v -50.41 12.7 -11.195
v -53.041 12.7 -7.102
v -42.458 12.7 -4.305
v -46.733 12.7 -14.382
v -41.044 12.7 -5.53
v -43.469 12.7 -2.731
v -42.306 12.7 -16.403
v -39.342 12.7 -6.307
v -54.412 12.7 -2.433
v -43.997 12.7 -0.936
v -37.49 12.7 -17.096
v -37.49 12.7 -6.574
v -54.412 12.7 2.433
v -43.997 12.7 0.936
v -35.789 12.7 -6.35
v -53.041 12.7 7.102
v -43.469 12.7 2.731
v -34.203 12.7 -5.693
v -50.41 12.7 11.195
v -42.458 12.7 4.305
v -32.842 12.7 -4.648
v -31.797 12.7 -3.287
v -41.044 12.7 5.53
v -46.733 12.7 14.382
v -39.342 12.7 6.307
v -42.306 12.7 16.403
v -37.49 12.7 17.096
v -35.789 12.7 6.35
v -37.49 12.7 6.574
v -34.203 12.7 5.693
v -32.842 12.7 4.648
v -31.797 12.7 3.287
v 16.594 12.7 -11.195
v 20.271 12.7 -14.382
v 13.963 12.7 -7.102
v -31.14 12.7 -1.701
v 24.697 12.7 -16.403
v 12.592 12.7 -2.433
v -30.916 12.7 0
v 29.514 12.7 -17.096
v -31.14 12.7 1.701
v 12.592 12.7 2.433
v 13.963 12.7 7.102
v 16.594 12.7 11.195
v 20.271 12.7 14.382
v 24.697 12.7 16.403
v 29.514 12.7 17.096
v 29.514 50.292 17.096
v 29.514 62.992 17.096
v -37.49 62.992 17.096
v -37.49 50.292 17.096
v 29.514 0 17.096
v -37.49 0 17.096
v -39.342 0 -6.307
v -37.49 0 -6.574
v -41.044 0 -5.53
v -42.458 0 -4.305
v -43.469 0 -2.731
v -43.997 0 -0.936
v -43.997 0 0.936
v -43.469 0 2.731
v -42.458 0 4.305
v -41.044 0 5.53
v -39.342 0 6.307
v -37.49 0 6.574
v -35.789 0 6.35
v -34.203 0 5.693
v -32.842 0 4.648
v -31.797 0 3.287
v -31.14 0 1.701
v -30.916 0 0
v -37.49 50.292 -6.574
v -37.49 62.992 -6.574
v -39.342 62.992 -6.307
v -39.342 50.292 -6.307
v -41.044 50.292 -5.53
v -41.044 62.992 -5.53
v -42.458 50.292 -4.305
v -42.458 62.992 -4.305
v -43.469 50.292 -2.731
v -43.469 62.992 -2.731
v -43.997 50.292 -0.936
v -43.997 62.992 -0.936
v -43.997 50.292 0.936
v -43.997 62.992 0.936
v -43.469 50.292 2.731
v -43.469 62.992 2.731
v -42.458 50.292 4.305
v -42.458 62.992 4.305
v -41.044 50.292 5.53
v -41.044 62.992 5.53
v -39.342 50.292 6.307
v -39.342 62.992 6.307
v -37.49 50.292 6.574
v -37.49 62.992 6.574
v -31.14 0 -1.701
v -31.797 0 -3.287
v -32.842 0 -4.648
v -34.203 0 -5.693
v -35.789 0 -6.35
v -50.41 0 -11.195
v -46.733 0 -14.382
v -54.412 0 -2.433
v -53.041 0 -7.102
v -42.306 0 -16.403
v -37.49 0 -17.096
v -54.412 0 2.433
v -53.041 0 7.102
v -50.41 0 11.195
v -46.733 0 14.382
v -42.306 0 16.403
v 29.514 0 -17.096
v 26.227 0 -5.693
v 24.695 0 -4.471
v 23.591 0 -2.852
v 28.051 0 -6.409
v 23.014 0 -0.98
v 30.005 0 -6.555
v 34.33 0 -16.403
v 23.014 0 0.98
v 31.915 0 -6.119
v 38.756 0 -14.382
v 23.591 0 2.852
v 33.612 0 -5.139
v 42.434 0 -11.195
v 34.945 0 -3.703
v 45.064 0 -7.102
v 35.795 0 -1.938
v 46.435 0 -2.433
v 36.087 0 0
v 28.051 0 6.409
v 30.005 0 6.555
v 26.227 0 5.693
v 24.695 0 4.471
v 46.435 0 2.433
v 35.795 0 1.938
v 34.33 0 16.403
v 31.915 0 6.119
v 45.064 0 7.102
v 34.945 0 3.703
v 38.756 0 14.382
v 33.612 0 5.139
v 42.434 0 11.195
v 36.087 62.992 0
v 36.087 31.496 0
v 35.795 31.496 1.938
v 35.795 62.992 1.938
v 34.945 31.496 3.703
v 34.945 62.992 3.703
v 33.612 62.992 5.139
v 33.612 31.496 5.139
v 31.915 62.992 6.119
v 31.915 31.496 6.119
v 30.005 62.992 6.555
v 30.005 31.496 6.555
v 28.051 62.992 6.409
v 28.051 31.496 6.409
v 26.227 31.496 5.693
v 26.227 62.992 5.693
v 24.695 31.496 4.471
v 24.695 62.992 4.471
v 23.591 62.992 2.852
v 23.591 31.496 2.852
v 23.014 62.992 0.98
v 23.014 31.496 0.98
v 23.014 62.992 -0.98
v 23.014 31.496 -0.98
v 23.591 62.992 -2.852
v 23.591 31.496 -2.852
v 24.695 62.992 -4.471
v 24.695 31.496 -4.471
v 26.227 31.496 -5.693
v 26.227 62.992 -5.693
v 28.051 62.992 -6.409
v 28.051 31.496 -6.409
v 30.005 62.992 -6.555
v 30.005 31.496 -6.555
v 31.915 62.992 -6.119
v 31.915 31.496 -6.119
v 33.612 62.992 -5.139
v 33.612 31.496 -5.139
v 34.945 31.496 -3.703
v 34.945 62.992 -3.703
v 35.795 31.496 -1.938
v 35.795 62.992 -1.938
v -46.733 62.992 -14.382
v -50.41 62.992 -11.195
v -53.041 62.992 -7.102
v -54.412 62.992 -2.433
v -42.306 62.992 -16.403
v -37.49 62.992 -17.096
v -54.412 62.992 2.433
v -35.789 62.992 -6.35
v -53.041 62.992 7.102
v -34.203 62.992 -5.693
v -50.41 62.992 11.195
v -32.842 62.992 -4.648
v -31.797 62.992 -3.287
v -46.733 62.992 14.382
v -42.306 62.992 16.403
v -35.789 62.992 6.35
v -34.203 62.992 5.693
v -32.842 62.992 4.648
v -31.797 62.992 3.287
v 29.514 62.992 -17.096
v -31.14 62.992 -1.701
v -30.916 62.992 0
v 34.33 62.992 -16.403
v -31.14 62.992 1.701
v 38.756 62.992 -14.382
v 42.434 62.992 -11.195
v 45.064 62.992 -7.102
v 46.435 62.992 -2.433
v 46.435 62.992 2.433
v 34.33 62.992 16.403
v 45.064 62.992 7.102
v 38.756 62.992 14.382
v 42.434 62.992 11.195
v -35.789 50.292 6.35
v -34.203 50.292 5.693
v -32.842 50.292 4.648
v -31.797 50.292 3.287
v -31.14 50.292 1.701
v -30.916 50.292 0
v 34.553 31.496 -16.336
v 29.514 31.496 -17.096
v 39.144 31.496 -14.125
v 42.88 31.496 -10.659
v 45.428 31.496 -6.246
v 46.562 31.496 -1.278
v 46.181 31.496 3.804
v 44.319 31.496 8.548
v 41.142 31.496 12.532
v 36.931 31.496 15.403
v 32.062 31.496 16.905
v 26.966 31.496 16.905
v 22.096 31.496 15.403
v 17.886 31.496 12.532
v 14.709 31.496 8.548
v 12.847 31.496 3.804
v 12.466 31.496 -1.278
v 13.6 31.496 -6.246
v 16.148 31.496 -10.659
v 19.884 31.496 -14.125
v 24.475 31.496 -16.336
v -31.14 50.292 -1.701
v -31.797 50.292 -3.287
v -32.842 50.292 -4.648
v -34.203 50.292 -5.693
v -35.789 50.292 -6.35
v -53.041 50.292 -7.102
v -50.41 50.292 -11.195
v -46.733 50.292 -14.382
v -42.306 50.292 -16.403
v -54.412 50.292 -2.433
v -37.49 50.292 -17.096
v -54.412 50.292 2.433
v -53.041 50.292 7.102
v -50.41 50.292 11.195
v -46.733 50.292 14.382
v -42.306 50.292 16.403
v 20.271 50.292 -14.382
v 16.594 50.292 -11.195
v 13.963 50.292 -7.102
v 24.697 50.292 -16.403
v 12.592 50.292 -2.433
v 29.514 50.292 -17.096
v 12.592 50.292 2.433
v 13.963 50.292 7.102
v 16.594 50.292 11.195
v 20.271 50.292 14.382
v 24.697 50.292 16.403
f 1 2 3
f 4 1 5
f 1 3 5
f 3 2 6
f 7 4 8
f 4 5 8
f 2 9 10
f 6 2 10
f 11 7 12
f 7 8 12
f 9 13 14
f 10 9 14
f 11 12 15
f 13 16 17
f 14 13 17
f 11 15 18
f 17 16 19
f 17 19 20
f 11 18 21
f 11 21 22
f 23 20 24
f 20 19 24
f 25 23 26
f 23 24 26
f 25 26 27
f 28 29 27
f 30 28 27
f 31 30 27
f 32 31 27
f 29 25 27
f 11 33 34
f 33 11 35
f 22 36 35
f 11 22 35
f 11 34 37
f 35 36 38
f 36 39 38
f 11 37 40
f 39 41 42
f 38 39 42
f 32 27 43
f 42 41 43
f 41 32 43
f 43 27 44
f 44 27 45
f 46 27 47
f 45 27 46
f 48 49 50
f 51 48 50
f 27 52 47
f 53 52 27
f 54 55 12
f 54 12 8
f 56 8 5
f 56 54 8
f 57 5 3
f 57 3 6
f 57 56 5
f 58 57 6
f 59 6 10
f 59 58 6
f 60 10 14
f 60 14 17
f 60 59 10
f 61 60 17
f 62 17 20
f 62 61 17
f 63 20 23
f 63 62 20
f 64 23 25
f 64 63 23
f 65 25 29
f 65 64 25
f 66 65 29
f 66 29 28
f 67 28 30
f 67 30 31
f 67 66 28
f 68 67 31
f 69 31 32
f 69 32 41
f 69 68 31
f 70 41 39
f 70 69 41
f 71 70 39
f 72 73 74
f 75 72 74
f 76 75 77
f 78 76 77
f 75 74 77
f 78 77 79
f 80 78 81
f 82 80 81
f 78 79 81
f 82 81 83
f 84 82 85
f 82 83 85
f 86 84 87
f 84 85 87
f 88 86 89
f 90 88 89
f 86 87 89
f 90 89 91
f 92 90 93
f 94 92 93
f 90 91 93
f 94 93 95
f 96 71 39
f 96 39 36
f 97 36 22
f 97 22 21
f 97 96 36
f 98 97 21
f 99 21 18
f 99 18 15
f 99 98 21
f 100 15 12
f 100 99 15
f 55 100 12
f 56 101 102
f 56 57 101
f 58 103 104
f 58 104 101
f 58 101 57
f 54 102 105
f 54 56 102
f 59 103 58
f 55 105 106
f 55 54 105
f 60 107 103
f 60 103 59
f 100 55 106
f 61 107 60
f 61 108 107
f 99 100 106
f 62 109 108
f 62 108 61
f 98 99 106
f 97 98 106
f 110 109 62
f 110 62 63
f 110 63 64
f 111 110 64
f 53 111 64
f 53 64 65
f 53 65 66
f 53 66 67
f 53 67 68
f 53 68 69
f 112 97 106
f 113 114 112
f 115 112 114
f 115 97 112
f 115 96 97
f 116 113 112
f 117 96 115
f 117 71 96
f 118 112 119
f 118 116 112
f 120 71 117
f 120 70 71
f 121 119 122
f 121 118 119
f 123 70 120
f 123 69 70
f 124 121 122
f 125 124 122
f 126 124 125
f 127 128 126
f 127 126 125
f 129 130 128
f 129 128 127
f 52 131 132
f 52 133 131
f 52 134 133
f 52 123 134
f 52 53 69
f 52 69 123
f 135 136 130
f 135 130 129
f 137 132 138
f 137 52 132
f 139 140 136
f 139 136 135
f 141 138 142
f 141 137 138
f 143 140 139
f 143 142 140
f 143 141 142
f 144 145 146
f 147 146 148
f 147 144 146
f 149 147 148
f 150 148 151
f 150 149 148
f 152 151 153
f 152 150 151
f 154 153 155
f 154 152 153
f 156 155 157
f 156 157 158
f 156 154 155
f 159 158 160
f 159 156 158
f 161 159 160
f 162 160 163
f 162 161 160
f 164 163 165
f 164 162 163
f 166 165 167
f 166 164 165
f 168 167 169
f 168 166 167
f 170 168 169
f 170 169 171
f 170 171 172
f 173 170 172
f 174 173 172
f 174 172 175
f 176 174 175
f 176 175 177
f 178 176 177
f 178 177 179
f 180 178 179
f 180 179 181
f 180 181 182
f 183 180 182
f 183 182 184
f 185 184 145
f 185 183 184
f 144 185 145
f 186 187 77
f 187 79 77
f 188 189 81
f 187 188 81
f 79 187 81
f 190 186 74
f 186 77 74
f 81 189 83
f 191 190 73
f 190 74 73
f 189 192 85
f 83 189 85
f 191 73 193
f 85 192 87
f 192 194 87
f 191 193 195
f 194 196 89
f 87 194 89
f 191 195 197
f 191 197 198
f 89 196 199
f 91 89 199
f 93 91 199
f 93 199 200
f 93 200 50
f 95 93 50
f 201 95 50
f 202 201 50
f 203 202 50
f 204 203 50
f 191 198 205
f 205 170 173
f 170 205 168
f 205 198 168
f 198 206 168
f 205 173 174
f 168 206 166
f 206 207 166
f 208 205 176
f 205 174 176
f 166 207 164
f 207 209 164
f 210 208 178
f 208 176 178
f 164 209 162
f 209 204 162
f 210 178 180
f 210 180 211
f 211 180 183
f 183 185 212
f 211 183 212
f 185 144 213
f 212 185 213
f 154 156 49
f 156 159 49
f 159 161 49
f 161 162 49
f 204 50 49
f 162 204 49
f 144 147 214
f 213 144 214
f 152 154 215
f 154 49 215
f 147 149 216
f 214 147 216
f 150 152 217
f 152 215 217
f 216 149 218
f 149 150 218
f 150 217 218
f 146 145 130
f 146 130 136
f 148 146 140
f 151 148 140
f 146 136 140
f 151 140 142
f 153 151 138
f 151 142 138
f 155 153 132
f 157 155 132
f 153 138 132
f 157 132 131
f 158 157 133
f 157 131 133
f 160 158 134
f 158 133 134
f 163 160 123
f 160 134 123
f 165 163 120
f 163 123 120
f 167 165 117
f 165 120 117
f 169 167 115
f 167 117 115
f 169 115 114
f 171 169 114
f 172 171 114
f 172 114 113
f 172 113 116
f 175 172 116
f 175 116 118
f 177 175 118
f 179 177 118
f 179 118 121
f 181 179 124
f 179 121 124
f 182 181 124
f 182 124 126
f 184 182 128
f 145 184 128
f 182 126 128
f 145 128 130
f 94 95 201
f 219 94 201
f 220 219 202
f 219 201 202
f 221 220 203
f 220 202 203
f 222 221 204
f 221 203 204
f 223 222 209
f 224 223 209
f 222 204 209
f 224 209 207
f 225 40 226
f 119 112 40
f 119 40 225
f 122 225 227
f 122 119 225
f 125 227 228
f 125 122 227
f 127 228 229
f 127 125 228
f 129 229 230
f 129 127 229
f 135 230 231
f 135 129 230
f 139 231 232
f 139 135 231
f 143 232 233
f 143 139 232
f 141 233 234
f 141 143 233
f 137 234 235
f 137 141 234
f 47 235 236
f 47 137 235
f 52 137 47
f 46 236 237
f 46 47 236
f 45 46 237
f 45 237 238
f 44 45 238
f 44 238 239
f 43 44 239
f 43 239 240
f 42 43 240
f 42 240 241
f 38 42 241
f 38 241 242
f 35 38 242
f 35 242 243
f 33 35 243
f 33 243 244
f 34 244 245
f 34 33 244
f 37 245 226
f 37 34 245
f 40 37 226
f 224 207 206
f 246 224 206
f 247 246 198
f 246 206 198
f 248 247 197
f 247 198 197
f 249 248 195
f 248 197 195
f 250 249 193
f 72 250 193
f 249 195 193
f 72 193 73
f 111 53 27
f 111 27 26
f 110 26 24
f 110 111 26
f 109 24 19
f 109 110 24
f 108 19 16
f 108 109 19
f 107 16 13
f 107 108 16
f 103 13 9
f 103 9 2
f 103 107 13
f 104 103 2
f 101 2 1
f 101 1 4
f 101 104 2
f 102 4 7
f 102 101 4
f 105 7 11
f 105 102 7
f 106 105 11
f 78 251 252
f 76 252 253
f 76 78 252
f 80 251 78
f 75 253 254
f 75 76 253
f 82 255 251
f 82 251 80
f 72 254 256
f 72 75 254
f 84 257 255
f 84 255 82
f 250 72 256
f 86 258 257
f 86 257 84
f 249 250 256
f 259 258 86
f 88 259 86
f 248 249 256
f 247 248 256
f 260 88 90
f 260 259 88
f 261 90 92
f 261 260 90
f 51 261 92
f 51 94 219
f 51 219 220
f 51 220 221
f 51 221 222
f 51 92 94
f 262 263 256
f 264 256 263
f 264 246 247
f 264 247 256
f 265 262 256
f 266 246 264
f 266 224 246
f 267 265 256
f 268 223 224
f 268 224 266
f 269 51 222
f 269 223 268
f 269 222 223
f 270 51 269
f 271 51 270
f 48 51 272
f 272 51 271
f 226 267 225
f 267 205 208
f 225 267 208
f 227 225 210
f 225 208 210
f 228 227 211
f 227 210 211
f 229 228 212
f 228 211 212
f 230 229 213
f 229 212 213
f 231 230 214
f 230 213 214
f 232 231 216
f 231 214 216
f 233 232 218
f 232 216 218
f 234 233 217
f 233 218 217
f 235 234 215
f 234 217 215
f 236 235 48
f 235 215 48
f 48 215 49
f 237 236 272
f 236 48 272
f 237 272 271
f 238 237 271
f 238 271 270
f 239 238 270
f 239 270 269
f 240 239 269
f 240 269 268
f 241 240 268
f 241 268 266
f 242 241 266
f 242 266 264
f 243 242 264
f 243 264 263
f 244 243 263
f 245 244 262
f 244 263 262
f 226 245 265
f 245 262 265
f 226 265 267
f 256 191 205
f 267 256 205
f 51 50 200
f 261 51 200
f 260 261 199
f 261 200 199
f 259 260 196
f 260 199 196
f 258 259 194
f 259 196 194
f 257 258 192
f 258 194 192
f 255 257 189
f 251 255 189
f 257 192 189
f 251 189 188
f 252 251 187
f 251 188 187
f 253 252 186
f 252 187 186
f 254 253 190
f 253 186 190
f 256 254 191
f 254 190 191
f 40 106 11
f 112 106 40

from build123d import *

# Parameters (mm, degrees)
F1_DEPTH = 12.7
F0_R     = 6.573501
F2_DEPTH = 31.496


with BuildPart() as f1:
    # F0 (on Front) → F1 (new body)
    with BuildSketch(Plane.XZ):
        with BuildLine():
            Line((-37.489949, -17.095566), (29.513806, -17.095566))
            ThreePointArc((29.513806, -17.095566), (12.41824, 0), (29.513806, 17.095566))
            Line((29.513806, 17.095566), (-37.489949, 17.095566))
            Line((-37.489949, 17.095566), (-37.489949, 6.573501))
            ThreePointArc((-37.489949, 6.573501), (-32.841781, 4.648167), (-30.916447, 0))
            ThreePointArc((-30.916447, 0), (-32.841781, -4.648167), (-37.489949, -6.573501))
            Line((-37.489949, -6.573501), (-37.489949, -17.095566))
        make_face()
        with BuildLine():
            ThreePointArc((-37.489949, 17.095566), (-54.585515, 0), (-37.489949, -17.095566))
            Line((-37.489949, -17.095566), (-37.489949, -6.573501))
            ThreePointArc((-37.489949, -6.573501), (-44.06345, 0), (-37.489949, 6.573501))
            Line((-37.489949, 6.573501), (-37.489949, 17.095566))
        make_face()
    extrude(amount=-F1_DEPTH)

    # F0 (on Front) → F2 (join)
    with BuildSketch(Plane.XZ):
        with BuildLine():
            ThreePointArc((29.513806, 17.095566), (12.41824, 0), (29.513806, -17.095566))
            ThreePointArc((29.513806, -17.095566), (46.609372, 0), (29.513806, 17.095566))
        make_face()
        with Locations((29.513806, 0)):
            Circle(F0_R, mode=Mode.SUBTRACT)
    extrude(amount=-F2_DEPTH)

    # F3: F1 across face


with BuildPart() as f1_1:
    add(f1.part)
    add(f1.part.mirror(Plane(origin=(29.513806, 31.496, 0), x_dir=(1, 0, 0), z_dir=(0, 1, 0))))


solid = f1_1.part
